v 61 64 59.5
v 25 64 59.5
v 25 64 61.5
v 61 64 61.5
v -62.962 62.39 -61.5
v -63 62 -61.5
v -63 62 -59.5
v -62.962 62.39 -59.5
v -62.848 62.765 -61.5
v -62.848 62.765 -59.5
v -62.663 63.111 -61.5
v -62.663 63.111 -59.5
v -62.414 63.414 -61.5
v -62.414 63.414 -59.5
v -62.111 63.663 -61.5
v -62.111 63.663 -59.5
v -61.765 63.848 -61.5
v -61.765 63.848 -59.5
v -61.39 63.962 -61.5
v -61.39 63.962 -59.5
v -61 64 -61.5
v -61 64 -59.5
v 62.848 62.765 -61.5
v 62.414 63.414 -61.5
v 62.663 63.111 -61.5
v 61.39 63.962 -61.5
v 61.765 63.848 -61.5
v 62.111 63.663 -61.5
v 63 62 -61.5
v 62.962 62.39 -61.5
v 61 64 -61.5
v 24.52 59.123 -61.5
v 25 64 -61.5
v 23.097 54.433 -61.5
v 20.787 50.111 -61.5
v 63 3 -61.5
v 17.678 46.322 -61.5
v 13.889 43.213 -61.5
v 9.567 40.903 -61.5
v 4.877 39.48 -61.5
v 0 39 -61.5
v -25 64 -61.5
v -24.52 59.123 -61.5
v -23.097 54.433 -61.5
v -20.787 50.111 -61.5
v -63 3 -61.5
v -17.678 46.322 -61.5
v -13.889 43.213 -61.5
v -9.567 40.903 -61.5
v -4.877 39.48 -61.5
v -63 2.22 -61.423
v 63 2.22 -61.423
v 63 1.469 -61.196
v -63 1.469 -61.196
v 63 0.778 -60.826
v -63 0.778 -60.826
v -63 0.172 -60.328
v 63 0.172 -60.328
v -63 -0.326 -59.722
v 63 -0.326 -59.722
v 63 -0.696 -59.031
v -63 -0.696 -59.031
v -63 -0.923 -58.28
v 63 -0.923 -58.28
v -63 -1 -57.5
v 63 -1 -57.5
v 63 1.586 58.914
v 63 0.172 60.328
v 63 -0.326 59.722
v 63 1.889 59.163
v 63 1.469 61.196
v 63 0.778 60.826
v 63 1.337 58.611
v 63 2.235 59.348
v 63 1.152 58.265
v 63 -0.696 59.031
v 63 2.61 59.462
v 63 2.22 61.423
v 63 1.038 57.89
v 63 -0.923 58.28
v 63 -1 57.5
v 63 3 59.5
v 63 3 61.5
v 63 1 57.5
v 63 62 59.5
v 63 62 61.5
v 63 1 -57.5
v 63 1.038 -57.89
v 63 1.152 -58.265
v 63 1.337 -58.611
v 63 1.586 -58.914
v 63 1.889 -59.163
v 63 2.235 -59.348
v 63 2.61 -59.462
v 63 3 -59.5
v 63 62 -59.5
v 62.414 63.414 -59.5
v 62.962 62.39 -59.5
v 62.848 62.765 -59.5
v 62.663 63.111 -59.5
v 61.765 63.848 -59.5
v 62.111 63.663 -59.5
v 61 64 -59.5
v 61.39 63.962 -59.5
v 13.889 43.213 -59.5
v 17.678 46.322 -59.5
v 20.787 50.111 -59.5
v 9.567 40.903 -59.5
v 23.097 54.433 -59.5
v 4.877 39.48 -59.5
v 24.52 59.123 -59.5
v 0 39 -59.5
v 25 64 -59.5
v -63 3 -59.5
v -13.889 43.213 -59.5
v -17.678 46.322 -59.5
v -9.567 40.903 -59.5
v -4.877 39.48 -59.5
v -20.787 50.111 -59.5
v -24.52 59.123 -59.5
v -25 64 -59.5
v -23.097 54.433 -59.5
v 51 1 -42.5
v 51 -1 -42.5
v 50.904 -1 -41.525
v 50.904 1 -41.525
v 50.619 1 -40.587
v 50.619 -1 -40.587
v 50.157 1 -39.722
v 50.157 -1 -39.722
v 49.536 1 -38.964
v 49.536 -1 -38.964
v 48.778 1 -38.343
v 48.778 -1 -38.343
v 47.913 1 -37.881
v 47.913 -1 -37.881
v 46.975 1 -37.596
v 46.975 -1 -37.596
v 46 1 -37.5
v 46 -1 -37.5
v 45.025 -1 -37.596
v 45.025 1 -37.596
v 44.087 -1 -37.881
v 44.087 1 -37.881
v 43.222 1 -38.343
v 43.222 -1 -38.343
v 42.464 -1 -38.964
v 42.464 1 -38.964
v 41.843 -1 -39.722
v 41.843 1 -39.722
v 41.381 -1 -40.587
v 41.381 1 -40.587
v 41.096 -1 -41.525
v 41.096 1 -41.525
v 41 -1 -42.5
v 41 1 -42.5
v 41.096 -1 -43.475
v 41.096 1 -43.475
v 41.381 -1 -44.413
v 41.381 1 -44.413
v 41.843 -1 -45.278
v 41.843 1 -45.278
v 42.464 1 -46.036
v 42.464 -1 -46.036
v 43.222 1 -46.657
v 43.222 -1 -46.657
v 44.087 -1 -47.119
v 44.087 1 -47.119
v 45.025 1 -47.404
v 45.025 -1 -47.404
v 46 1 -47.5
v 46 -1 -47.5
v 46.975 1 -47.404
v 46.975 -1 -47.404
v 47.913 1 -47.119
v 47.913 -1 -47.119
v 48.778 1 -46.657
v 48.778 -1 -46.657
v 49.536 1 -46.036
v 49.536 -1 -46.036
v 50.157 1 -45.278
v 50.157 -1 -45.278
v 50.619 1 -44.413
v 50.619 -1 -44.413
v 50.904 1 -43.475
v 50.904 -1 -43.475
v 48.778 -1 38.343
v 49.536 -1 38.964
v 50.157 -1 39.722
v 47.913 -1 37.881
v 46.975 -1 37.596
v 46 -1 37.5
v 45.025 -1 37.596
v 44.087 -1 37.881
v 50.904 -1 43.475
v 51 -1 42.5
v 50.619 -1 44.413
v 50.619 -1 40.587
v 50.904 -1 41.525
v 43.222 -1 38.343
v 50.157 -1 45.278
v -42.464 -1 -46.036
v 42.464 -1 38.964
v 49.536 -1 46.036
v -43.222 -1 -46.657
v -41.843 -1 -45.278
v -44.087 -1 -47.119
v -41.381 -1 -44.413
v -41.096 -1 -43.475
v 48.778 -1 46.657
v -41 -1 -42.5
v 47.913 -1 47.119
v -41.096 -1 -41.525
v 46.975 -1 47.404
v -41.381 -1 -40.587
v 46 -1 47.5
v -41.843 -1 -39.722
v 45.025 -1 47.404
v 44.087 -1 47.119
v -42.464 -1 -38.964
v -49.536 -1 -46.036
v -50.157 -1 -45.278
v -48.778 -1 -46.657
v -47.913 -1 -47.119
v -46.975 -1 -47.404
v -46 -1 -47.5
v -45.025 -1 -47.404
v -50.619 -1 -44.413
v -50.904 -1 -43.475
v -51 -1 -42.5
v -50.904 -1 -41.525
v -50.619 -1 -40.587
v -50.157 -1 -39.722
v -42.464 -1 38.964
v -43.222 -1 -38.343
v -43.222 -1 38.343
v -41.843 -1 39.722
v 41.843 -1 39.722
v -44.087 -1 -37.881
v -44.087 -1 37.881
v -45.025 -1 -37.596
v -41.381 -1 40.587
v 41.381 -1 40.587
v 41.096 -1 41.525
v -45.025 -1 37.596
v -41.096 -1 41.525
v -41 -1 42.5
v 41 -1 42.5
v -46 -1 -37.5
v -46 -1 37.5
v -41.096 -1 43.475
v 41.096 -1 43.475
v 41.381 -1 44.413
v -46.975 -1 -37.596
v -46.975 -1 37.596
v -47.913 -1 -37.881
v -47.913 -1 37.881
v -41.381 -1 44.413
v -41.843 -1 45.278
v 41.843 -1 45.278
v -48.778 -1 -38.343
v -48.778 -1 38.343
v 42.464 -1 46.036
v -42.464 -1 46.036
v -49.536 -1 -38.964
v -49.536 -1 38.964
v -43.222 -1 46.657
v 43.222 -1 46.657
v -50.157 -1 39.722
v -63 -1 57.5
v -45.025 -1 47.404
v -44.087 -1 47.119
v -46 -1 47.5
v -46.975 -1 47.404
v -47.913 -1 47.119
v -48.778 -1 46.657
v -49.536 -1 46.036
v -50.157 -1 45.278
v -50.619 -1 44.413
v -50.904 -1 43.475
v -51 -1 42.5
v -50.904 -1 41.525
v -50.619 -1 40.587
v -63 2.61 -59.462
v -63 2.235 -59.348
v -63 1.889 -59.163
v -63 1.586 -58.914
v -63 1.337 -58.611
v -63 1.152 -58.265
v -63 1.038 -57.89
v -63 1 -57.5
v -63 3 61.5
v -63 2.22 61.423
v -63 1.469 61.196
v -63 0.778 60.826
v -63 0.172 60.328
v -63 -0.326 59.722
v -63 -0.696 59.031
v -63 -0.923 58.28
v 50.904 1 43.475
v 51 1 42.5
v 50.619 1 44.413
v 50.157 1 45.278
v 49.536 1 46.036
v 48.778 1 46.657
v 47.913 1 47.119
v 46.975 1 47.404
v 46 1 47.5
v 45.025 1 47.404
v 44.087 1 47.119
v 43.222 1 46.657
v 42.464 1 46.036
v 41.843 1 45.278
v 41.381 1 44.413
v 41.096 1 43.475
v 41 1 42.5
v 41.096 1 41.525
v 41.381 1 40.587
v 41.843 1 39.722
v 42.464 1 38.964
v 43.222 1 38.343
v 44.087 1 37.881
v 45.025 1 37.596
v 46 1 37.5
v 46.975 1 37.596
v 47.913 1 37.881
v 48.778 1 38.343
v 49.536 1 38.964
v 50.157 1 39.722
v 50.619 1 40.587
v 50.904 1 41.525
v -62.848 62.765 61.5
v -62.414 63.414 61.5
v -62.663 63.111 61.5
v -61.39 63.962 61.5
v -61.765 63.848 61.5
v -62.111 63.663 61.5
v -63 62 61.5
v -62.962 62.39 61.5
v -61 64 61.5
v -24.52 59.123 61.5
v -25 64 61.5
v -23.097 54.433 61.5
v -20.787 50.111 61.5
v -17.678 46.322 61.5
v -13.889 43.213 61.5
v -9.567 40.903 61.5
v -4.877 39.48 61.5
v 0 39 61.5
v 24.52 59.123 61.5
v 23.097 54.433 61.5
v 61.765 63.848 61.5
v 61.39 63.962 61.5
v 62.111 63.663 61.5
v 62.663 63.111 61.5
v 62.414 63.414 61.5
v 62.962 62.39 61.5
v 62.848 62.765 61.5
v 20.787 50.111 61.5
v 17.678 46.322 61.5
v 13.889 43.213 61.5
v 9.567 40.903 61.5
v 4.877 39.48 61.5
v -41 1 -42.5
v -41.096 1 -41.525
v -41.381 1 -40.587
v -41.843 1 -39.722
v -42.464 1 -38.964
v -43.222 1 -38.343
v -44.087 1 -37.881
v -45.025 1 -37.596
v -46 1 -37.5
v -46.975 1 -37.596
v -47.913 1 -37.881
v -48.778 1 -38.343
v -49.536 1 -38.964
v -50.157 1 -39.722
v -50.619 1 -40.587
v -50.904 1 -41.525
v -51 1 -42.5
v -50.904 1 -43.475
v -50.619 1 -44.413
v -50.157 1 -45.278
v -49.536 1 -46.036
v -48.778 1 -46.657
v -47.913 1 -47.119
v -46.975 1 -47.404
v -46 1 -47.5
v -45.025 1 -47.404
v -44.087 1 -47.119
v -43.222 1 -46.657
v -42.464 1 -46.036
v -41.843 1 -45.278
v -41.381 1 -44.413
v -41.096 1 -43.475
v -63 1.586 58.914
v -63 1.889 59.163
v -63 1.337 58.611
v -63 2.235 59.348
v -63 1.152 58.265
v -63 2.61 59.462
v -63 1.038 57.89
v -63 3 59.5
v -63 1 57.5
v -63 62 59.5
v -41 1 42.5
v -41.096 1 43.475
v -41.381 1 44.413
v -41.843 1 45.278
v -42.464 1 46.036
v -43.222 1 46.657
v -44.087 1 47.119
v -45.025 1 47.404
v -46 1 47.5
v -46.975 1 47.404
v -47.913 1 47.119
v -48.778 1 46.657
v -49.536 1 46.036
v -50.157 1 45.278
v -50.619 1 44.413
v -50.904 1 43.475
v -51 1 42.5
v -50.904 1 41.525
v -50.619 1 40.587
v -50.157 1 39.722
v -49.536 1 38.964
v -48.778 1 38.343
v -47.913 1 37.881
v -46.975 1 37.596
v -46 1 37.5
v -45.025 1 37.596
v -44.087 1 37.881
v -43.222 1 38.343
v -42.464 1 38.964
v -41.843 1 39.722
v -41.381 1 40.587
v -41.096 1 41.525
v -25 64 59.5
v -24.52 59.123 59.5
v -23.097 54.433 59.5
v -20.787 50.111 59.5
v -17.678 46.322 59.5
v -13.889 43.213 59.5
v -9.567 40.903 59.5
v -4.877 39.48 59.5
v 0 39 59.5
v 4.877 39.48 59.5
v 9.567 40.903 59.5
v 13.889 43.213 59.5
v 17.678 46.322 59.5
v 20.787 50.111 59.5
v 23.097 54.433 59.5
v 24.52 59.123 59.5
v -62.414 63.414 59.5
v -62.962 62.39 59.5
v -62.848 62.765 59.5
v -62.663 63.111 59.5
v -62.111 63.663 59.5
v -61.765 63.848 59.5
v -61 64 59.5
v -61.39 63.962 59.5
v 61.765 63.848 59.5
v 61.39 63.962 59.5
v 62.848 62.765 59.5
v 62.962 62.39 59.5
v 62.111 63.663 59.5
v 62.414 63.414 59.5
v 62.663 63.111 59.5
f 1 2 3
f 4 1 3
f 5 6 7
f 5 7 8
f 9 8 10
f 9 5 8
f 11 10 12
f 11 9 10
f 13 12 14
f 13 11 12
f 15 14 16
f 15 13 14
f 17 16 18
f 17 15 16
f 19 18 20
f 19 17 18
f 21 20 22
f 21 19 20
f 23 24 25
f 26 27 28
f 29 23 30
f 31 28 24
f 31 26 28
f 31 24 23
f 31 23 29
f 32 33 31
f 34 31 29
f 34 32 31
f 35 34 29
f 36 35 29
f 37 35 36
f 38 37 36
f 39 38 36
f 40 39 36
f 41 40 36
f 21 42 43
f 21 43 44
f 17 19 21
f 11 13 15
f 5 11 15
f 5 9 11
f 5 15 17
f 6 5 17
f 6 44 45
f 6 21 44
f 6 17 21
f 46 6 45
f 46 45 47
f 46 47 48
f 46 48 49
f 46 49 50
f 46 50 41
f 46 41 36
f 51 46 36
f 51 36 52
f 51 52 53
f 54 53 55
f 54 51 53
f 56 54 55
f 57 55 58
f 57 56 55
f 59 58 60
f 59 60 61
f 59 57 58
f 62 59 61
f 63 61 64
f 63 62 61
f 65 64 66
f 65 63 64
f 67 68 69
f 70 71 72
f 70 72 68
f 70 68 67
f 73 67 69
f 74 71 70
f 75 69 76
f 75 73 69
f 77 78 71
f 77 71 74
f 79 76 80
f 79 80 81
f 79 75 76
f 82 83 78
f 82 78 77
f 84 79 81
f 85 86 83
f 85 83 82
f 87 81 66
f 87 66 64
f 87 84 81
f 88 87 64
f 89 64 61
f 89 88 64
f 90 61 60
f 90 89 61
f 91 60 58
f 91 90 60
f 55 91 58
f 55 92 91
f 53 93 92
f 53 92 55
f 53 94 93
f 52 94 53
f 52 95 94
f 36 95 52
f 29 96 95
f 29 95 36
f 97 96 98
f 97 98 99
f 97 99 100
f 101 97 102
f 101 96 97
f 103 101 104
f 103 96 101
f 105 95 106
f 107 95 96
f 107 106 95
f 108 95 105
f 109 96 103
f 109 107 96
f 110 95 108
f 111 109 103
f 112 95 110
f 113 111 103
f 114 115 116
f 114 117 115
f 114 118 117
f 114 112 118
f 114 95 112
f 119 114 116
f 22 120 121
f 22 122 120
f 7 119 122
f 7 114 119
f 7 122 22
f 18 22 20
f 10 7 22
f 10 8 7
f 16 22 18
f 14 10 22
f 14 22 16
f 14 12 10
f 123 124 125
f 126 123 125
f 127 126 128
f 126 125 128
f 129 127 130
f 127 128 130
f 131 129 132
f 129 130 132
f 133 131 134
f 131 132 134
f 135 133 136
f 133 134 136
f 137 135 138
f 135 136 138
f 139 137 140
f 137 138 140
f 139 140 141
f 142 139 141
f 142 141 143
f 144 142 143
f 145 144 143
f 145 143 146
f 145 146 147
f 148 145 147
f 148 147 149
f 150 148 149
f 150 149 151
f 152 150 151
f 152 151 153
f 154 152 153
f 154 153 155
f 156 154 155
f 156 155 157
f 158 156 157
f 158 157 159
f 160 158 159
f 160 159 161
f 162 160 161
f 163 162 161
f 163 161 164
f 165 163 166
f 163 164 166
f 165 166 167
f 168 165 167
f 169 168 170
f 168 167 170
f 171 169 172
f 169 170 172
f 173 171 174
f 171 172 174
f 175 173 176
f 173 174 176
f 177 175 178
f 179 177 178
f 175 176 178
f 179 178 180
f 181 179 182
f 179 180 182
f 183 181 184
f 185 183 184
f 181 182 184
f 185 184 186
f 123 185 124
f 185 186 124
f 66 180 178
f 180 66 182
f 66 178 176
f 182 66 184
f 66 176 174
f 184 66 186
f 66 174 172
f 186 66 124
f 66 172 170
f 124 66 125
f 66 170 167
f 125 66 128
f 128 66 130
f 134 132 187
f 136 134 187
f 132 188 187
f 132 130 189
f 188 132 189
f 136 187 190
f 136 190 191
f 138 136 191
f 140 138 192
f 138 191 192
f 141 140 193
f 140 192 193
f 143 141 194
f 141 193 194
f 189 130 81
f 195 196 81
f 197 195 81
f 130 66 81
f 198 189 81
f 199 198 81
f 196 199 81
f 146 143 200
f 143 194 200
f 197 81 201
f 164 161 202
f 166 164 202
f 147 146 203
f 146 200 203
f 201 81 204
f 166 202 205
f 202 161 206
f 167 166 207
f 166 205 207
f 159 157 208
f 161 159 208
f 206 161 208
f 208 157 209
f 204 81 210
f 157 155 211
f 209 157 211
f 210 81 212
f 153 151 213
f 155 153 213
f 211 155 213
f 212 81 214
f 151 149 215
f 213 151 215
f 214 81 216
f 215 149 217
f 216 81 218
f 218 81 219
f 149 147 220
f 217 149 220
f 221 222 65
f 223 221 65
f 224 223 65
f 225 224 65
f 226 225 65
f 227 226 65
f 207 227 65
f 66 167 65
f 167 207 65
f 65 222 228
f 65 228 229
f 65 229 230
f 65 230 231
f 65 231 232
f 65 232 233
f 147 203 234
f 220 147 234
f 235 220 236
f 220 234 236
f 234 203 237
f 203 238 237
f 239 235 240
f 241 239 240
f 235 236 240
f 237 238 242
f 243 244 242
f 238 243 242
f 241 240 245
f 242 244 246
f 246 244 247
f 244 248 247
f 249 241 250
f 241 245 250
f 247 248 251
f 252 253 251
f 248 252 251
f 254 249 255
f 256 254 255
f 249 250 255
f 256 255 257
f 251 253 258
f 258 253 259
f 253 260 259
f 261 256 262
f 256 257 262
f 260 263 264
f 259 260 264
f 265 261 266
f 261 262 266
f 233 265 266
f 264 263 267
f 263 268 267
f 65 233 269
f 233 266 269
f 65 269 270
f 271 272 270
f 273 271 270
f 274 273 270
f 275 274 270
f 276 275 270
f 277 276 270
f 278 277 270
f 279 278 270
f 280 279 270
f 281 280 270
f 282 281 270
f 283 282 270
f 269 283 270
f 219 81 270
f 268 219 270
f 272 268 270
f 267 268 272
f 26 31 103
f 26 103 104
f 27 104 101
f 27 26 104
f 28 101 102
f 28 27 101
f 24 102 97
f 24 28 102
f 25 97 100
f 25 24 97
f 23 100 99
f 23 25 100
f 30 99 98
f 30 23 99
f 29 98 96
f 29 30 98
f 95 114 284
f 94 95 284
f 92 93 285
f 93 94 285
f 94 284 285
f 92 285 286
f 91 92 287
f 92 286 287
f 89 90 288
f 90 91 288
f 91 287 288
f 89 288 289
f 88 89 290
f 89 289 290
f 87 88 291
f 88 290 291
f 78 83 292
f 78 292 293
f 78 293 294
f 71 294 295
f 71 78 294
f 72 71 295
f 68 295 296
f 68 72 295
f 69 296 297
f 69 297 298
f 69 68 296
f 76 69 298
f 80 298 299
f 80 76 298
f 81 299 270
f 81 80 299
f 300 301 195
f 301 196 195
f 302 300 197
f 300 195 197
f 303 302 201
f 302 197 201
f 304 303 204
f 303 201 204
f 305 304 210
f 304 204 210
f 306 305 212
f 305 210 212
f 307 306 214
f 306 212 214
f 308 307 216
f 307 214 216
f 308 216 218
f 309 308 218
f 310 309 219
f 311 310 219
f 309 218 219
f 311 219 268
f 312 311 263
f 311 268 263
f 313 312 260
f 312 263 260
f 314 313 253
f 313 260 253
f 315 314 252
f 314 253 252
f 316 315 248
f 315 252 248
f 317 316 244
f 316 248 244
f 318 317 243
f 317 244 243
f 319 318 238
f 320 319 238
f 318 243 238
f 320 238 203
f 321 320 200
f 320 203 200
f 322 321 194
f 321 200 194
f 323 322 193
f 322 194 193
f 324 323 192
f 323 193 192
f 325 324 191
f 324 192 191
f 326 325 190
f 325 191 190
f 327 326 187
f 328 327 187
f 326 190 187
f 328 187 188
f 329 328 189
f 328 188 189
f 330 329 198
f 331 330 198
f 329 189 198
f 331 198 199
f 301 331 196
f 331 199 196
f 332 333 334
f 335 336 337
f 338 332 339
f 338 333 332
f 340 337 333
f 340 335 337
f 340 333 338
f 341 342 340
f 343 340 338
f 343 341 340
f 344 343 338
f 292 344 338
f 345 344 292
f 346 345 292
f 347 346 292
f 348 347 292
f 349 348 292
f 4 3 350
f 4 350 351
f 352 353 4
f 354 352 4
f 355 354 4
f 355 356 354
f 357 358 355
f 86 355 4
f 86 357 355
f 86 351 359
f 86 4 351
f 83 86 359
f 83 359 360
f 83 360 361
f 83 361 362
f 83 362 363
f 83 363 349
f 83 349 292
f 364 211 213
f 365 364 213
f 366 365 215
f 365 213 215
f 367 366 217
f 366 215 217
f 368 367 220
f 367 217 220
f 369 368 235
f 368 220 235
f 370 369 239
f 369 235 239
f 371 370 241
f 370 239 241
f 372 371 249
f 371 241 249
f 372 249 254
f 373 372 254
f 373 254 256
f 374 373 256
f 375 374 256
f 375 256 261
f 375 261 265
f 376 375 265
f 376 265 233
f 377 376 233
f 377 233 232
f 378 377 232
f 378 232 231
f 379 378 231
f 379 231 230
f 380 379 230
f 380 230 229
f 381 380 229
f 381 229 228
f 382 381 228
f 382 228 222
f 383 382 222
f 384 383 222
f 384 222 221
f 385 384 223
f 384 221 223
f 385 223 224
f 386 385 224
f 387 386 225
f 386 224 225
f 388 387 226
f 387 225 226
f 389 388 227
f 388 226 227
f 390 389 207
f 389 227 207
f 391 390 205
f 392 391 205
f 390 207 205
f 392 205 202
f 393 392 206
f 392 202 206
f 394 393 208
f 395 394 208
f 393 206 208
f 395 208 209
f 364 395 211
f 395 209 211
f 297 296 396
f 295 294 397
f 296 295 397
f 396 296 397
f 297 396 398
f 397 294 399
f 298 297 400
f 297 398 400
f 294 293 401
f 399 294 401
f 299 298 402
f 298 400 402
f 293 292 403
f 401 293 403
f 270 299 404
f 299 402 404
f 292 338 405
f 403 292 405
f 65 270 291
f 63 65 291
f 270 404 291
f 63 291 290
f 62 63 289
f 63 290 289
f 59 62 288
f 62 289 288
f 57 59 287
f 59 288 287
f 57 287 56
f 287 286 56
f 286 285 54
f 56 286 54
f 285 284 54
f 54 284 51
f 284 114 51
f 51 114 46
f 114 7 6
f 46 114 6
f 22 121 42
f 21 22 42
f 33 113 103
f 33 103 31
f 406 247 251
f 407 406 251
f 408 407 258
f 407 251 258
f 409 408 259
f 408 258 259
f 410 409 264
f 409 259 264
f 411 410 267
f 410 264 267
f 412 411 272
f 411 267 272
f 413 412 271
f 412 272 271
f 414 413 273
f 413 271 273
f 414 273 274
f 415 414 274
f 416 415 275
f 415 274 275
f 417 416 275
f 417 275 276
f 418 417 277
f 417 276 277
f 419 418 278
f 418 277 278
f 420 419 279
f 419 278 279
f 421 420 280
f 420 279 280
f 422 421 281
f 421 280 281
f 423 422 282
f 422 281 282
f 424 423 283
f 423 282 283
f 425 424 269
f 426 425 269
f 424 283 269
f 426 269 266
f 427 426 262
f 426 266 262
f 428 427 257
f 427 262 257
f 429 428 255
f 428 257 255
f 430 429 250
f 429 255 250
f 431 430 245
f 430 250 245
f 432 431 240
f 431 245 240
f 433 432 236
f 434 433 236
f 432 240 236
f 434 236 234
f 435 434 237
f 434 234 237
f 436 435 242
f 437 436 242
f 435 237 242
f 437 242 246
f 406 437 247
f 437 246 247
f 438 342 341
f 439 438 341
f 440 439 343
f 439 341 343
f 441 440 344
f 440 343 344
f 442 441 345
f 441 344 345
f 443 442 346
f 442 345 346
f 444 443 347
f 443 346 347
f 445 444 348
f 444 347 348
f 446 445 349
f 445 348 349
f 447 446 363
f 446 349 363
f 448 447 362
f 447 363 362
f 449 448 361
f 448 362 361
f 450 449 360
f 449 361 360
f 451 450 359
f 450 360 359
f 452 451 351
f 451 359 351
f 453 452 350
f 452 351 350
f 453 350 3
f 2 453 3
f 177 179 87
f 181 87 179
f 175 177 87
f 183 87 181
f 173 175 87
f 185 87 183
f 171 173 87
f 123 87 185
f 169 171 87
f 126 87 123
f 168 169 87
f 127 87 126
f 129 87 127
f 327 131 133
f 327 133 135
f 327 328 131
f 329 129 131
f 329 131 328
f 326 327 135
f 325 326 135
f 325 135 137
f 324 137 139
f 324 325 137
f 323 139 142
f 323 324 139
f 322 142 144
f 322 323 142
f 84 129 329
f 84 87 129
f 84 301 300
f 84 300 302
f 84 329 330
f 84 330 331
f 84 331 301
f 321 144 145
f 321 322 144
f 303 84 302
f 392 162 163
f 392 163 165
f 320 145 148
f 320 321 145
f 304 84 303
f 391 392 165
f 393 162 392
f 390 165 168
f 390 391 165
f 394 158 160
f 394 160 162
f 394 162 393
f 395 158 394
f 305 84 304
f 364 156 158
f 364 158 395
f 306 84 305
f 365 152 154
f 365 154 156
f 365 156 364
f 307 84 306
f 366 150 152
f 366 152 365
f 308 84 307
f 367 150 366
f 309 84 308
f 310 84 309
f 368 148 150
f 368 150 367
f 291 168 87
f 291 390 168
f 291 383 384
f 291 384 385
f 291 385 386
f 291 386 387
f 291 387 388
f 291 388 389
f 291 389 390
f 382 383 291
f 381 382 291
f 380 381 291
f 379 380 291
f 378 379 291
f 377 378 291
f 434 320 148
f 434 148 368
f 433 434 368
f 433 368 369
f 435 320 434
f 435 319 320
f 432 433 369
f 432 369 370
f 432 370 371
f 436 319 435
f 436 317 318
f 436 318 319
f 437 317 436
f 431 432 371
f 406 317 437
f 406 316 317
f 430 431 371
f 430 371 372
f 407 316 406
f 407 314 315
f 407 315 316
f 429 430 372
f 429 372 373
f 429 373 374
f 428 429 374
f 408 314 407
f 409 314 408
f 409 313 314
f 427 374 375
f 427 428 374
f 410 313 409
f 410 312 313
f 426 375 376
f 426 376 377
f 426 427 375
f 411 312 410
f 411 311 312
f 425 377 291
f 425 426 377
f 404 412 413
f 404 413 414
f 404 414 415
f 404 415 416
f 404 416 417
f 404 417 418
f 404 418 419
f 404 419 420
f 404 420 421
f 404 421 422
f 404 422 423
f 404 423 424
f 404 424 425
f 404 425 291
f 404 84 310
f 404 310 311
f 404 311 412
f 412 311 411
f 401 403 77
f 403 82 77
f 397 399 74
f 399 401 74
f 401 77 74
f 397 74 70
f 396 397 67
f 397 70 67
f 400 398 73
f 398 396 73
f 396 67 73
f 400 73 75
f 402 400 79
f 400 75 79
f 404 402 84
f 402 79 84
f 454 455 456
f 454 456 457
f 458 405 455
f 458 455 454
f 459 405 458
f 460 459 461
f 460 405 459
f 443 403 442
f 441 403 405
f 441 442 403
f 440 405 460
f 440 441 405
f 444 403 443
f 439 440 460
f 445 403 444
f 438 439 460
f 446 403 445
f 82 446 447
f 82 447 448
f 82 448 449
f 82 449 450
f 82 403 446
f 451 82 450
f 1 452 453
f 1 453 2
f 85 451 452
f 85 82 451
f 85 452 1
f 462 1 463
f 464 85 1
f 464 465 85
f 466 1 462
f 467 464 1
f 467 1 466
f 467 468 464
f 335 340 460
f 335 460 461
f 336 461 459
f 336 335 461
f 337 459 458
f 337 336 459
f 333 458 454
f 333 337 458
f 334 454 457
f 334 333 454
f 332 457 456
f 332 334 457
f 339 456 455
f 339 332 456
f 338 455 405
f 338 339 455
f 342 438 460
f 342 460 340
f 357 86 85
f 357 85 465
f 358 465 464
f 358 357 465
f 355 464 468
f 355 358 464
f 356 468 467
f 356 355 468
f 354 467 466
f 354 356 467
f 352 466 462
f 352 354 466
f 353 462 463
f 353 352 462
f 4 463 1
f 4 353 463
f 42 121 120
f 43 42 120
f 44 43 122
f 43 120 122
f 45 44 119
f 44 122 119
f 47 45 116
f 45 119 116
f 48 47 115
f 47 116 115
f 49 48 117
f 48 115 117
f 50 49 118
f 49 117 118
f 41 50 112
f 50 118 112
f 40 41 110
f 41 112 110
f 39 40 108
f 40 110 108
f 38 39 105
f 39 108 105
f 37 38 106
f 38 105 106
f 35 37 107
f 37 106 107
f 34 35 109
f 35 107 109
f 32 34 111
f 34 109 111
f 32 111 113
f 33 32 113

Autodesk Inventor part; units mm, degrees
ref_plane "YZ Plane" through (0, 0, 0) normal (1, 0, 0) x (0, 1, 0)
ref_plane "XZ Plane" through (0, 0, 0) normal (0, 1, 0) x (-1, 0, 0)
ref_plane "XY Plane" through (0, 0, 0) normal (0, 0, 1) x (1, 0, 0)
sketch "Sketch4" plane through (0, 0, 0) normal (0, 1, 0) x (-1, 0, 0)
  line L0 (63, -57.5) -> (-63, -57.5)
  line L1 (-63, -57.5) -> (-63, 57.5)
  line L2 (-63, 57.5) -> (63, 57.5)
  line L3 (63, 57.5) -> (63, -57.5)
  line L4 (63, -57.5) -> (-63, 57.5) construction
  point P0 (0, 0)
  point P1 (0, 0)
  dimension "d24" = 126
  dimension "d25" = 115
extrude "Plate4" add sketch "Sketch4" along normal mid plane 2
sketch "Sketch5" plane through (63, 3, 59.5) normal (0, 0, 1) x (1, 0, 0)
  line L0 (-126, 0) -> (0, 0)
  line L1 (0, 0) -> (0, 61)
  line L2 (0, 61) -> (-126, 61)
  line L3 (-126, 61) -> (-126, 0)
edge flange "Flange3" height 65 angle 90 thickness 2 bend radius 2 thickness toward (0, 0, 1) relief tear relief width 2 relief depth 1 corner gap 2 corner form 0 edges at (0, 1, 57.5) (0, 1, -57.5) wall of the first edge with corners at (-63, 3, 59.5) (63, 3, 59.5) (63, 64, 59.5) (-63, 64, 59.5)
bend "Bend3"
corner "Corner3"
sketch "Sketch6" plane through (-63, 64, 61.5) normal (0, 0, 1) x (1, 0, 0)
  line L0 (0, 0) -> (126, 0) projected
  circle A0 centre (63, 0) radius 25
  point P0 (63, -64)
  dimension "d37" = 50
extrude "Extrusion1" cut sketch "Sketch6" against normal through all
fillet "Fillet1" radius 2 4 edges at (-63, 64, -60.5) (63, 64, -60.5) (63, 64, 60.5) (-63, 64, 60.5)
sketch "Sketch7" plane through (0, -1, 0) normal (0, -1, 0) x (1, 0, 0)
  circle A0 centre (46, -42.5) radius 5
  line L0 (63, 57.5) -> (63, -57.5) projected
  line L1 (63, -57.5) -> (-63, -57.5) projected
  line L2 (25, 59.5) -> (-25, 59.5) construction
  line L3 (0, -74.3103) -> (0, 74.3103) construction
  line L4 (114.9724, 0) -> (-114.9724, 0) construction
  circle A1 centre (-46, -42.5) radius 5
  circle A2 centre (46, 42.5) radius 5
  circle A3 centre (-46, 42.5) radius 5
  point P0 (0, 0)
  point P1 (0, 0)
  dimension "d41" = 10
  dimension "d42" = 17
  dimension "d43" = 15
extrude "Extrusion2" cut sketch "Sketch7" against normal up to surface (2 mm away)
equation "\"d26\" = Thickness"
equation "\"d27\" = BendReliefWidth"
equation "\"d28\" = BendReliefDepth"
equation "\"d29\" = MinimumRemnant"
equation "\"d30\" = TransitionRadius"
equation "\"d33\" = BendRadius"
equation "\"d34\" = CornerReliefSize"
equation "\"d35\" = GapSize"
equation "\"d36\" = JacobiRadiusSize"
equation "\"BendRadius\" = Thickness"
equation "\"BendReliefWidth\" = Thickness"
equation "\"BendReliefDepth\" = 0.5 * Thickness"
equation "\"CornerReliefSize\" = 4 * Thickness"
equation "\"MinimumRemnant\" = 2 * Thickness"
equation "\"TransitionRadius\" = BendRadius"
equation "\"JacobiRadiusSize\" = BendRadius"
equation "\"GapSize\" = Thickness"
equation "\"Thickness\" = 2"
properties part number "Крепление"
